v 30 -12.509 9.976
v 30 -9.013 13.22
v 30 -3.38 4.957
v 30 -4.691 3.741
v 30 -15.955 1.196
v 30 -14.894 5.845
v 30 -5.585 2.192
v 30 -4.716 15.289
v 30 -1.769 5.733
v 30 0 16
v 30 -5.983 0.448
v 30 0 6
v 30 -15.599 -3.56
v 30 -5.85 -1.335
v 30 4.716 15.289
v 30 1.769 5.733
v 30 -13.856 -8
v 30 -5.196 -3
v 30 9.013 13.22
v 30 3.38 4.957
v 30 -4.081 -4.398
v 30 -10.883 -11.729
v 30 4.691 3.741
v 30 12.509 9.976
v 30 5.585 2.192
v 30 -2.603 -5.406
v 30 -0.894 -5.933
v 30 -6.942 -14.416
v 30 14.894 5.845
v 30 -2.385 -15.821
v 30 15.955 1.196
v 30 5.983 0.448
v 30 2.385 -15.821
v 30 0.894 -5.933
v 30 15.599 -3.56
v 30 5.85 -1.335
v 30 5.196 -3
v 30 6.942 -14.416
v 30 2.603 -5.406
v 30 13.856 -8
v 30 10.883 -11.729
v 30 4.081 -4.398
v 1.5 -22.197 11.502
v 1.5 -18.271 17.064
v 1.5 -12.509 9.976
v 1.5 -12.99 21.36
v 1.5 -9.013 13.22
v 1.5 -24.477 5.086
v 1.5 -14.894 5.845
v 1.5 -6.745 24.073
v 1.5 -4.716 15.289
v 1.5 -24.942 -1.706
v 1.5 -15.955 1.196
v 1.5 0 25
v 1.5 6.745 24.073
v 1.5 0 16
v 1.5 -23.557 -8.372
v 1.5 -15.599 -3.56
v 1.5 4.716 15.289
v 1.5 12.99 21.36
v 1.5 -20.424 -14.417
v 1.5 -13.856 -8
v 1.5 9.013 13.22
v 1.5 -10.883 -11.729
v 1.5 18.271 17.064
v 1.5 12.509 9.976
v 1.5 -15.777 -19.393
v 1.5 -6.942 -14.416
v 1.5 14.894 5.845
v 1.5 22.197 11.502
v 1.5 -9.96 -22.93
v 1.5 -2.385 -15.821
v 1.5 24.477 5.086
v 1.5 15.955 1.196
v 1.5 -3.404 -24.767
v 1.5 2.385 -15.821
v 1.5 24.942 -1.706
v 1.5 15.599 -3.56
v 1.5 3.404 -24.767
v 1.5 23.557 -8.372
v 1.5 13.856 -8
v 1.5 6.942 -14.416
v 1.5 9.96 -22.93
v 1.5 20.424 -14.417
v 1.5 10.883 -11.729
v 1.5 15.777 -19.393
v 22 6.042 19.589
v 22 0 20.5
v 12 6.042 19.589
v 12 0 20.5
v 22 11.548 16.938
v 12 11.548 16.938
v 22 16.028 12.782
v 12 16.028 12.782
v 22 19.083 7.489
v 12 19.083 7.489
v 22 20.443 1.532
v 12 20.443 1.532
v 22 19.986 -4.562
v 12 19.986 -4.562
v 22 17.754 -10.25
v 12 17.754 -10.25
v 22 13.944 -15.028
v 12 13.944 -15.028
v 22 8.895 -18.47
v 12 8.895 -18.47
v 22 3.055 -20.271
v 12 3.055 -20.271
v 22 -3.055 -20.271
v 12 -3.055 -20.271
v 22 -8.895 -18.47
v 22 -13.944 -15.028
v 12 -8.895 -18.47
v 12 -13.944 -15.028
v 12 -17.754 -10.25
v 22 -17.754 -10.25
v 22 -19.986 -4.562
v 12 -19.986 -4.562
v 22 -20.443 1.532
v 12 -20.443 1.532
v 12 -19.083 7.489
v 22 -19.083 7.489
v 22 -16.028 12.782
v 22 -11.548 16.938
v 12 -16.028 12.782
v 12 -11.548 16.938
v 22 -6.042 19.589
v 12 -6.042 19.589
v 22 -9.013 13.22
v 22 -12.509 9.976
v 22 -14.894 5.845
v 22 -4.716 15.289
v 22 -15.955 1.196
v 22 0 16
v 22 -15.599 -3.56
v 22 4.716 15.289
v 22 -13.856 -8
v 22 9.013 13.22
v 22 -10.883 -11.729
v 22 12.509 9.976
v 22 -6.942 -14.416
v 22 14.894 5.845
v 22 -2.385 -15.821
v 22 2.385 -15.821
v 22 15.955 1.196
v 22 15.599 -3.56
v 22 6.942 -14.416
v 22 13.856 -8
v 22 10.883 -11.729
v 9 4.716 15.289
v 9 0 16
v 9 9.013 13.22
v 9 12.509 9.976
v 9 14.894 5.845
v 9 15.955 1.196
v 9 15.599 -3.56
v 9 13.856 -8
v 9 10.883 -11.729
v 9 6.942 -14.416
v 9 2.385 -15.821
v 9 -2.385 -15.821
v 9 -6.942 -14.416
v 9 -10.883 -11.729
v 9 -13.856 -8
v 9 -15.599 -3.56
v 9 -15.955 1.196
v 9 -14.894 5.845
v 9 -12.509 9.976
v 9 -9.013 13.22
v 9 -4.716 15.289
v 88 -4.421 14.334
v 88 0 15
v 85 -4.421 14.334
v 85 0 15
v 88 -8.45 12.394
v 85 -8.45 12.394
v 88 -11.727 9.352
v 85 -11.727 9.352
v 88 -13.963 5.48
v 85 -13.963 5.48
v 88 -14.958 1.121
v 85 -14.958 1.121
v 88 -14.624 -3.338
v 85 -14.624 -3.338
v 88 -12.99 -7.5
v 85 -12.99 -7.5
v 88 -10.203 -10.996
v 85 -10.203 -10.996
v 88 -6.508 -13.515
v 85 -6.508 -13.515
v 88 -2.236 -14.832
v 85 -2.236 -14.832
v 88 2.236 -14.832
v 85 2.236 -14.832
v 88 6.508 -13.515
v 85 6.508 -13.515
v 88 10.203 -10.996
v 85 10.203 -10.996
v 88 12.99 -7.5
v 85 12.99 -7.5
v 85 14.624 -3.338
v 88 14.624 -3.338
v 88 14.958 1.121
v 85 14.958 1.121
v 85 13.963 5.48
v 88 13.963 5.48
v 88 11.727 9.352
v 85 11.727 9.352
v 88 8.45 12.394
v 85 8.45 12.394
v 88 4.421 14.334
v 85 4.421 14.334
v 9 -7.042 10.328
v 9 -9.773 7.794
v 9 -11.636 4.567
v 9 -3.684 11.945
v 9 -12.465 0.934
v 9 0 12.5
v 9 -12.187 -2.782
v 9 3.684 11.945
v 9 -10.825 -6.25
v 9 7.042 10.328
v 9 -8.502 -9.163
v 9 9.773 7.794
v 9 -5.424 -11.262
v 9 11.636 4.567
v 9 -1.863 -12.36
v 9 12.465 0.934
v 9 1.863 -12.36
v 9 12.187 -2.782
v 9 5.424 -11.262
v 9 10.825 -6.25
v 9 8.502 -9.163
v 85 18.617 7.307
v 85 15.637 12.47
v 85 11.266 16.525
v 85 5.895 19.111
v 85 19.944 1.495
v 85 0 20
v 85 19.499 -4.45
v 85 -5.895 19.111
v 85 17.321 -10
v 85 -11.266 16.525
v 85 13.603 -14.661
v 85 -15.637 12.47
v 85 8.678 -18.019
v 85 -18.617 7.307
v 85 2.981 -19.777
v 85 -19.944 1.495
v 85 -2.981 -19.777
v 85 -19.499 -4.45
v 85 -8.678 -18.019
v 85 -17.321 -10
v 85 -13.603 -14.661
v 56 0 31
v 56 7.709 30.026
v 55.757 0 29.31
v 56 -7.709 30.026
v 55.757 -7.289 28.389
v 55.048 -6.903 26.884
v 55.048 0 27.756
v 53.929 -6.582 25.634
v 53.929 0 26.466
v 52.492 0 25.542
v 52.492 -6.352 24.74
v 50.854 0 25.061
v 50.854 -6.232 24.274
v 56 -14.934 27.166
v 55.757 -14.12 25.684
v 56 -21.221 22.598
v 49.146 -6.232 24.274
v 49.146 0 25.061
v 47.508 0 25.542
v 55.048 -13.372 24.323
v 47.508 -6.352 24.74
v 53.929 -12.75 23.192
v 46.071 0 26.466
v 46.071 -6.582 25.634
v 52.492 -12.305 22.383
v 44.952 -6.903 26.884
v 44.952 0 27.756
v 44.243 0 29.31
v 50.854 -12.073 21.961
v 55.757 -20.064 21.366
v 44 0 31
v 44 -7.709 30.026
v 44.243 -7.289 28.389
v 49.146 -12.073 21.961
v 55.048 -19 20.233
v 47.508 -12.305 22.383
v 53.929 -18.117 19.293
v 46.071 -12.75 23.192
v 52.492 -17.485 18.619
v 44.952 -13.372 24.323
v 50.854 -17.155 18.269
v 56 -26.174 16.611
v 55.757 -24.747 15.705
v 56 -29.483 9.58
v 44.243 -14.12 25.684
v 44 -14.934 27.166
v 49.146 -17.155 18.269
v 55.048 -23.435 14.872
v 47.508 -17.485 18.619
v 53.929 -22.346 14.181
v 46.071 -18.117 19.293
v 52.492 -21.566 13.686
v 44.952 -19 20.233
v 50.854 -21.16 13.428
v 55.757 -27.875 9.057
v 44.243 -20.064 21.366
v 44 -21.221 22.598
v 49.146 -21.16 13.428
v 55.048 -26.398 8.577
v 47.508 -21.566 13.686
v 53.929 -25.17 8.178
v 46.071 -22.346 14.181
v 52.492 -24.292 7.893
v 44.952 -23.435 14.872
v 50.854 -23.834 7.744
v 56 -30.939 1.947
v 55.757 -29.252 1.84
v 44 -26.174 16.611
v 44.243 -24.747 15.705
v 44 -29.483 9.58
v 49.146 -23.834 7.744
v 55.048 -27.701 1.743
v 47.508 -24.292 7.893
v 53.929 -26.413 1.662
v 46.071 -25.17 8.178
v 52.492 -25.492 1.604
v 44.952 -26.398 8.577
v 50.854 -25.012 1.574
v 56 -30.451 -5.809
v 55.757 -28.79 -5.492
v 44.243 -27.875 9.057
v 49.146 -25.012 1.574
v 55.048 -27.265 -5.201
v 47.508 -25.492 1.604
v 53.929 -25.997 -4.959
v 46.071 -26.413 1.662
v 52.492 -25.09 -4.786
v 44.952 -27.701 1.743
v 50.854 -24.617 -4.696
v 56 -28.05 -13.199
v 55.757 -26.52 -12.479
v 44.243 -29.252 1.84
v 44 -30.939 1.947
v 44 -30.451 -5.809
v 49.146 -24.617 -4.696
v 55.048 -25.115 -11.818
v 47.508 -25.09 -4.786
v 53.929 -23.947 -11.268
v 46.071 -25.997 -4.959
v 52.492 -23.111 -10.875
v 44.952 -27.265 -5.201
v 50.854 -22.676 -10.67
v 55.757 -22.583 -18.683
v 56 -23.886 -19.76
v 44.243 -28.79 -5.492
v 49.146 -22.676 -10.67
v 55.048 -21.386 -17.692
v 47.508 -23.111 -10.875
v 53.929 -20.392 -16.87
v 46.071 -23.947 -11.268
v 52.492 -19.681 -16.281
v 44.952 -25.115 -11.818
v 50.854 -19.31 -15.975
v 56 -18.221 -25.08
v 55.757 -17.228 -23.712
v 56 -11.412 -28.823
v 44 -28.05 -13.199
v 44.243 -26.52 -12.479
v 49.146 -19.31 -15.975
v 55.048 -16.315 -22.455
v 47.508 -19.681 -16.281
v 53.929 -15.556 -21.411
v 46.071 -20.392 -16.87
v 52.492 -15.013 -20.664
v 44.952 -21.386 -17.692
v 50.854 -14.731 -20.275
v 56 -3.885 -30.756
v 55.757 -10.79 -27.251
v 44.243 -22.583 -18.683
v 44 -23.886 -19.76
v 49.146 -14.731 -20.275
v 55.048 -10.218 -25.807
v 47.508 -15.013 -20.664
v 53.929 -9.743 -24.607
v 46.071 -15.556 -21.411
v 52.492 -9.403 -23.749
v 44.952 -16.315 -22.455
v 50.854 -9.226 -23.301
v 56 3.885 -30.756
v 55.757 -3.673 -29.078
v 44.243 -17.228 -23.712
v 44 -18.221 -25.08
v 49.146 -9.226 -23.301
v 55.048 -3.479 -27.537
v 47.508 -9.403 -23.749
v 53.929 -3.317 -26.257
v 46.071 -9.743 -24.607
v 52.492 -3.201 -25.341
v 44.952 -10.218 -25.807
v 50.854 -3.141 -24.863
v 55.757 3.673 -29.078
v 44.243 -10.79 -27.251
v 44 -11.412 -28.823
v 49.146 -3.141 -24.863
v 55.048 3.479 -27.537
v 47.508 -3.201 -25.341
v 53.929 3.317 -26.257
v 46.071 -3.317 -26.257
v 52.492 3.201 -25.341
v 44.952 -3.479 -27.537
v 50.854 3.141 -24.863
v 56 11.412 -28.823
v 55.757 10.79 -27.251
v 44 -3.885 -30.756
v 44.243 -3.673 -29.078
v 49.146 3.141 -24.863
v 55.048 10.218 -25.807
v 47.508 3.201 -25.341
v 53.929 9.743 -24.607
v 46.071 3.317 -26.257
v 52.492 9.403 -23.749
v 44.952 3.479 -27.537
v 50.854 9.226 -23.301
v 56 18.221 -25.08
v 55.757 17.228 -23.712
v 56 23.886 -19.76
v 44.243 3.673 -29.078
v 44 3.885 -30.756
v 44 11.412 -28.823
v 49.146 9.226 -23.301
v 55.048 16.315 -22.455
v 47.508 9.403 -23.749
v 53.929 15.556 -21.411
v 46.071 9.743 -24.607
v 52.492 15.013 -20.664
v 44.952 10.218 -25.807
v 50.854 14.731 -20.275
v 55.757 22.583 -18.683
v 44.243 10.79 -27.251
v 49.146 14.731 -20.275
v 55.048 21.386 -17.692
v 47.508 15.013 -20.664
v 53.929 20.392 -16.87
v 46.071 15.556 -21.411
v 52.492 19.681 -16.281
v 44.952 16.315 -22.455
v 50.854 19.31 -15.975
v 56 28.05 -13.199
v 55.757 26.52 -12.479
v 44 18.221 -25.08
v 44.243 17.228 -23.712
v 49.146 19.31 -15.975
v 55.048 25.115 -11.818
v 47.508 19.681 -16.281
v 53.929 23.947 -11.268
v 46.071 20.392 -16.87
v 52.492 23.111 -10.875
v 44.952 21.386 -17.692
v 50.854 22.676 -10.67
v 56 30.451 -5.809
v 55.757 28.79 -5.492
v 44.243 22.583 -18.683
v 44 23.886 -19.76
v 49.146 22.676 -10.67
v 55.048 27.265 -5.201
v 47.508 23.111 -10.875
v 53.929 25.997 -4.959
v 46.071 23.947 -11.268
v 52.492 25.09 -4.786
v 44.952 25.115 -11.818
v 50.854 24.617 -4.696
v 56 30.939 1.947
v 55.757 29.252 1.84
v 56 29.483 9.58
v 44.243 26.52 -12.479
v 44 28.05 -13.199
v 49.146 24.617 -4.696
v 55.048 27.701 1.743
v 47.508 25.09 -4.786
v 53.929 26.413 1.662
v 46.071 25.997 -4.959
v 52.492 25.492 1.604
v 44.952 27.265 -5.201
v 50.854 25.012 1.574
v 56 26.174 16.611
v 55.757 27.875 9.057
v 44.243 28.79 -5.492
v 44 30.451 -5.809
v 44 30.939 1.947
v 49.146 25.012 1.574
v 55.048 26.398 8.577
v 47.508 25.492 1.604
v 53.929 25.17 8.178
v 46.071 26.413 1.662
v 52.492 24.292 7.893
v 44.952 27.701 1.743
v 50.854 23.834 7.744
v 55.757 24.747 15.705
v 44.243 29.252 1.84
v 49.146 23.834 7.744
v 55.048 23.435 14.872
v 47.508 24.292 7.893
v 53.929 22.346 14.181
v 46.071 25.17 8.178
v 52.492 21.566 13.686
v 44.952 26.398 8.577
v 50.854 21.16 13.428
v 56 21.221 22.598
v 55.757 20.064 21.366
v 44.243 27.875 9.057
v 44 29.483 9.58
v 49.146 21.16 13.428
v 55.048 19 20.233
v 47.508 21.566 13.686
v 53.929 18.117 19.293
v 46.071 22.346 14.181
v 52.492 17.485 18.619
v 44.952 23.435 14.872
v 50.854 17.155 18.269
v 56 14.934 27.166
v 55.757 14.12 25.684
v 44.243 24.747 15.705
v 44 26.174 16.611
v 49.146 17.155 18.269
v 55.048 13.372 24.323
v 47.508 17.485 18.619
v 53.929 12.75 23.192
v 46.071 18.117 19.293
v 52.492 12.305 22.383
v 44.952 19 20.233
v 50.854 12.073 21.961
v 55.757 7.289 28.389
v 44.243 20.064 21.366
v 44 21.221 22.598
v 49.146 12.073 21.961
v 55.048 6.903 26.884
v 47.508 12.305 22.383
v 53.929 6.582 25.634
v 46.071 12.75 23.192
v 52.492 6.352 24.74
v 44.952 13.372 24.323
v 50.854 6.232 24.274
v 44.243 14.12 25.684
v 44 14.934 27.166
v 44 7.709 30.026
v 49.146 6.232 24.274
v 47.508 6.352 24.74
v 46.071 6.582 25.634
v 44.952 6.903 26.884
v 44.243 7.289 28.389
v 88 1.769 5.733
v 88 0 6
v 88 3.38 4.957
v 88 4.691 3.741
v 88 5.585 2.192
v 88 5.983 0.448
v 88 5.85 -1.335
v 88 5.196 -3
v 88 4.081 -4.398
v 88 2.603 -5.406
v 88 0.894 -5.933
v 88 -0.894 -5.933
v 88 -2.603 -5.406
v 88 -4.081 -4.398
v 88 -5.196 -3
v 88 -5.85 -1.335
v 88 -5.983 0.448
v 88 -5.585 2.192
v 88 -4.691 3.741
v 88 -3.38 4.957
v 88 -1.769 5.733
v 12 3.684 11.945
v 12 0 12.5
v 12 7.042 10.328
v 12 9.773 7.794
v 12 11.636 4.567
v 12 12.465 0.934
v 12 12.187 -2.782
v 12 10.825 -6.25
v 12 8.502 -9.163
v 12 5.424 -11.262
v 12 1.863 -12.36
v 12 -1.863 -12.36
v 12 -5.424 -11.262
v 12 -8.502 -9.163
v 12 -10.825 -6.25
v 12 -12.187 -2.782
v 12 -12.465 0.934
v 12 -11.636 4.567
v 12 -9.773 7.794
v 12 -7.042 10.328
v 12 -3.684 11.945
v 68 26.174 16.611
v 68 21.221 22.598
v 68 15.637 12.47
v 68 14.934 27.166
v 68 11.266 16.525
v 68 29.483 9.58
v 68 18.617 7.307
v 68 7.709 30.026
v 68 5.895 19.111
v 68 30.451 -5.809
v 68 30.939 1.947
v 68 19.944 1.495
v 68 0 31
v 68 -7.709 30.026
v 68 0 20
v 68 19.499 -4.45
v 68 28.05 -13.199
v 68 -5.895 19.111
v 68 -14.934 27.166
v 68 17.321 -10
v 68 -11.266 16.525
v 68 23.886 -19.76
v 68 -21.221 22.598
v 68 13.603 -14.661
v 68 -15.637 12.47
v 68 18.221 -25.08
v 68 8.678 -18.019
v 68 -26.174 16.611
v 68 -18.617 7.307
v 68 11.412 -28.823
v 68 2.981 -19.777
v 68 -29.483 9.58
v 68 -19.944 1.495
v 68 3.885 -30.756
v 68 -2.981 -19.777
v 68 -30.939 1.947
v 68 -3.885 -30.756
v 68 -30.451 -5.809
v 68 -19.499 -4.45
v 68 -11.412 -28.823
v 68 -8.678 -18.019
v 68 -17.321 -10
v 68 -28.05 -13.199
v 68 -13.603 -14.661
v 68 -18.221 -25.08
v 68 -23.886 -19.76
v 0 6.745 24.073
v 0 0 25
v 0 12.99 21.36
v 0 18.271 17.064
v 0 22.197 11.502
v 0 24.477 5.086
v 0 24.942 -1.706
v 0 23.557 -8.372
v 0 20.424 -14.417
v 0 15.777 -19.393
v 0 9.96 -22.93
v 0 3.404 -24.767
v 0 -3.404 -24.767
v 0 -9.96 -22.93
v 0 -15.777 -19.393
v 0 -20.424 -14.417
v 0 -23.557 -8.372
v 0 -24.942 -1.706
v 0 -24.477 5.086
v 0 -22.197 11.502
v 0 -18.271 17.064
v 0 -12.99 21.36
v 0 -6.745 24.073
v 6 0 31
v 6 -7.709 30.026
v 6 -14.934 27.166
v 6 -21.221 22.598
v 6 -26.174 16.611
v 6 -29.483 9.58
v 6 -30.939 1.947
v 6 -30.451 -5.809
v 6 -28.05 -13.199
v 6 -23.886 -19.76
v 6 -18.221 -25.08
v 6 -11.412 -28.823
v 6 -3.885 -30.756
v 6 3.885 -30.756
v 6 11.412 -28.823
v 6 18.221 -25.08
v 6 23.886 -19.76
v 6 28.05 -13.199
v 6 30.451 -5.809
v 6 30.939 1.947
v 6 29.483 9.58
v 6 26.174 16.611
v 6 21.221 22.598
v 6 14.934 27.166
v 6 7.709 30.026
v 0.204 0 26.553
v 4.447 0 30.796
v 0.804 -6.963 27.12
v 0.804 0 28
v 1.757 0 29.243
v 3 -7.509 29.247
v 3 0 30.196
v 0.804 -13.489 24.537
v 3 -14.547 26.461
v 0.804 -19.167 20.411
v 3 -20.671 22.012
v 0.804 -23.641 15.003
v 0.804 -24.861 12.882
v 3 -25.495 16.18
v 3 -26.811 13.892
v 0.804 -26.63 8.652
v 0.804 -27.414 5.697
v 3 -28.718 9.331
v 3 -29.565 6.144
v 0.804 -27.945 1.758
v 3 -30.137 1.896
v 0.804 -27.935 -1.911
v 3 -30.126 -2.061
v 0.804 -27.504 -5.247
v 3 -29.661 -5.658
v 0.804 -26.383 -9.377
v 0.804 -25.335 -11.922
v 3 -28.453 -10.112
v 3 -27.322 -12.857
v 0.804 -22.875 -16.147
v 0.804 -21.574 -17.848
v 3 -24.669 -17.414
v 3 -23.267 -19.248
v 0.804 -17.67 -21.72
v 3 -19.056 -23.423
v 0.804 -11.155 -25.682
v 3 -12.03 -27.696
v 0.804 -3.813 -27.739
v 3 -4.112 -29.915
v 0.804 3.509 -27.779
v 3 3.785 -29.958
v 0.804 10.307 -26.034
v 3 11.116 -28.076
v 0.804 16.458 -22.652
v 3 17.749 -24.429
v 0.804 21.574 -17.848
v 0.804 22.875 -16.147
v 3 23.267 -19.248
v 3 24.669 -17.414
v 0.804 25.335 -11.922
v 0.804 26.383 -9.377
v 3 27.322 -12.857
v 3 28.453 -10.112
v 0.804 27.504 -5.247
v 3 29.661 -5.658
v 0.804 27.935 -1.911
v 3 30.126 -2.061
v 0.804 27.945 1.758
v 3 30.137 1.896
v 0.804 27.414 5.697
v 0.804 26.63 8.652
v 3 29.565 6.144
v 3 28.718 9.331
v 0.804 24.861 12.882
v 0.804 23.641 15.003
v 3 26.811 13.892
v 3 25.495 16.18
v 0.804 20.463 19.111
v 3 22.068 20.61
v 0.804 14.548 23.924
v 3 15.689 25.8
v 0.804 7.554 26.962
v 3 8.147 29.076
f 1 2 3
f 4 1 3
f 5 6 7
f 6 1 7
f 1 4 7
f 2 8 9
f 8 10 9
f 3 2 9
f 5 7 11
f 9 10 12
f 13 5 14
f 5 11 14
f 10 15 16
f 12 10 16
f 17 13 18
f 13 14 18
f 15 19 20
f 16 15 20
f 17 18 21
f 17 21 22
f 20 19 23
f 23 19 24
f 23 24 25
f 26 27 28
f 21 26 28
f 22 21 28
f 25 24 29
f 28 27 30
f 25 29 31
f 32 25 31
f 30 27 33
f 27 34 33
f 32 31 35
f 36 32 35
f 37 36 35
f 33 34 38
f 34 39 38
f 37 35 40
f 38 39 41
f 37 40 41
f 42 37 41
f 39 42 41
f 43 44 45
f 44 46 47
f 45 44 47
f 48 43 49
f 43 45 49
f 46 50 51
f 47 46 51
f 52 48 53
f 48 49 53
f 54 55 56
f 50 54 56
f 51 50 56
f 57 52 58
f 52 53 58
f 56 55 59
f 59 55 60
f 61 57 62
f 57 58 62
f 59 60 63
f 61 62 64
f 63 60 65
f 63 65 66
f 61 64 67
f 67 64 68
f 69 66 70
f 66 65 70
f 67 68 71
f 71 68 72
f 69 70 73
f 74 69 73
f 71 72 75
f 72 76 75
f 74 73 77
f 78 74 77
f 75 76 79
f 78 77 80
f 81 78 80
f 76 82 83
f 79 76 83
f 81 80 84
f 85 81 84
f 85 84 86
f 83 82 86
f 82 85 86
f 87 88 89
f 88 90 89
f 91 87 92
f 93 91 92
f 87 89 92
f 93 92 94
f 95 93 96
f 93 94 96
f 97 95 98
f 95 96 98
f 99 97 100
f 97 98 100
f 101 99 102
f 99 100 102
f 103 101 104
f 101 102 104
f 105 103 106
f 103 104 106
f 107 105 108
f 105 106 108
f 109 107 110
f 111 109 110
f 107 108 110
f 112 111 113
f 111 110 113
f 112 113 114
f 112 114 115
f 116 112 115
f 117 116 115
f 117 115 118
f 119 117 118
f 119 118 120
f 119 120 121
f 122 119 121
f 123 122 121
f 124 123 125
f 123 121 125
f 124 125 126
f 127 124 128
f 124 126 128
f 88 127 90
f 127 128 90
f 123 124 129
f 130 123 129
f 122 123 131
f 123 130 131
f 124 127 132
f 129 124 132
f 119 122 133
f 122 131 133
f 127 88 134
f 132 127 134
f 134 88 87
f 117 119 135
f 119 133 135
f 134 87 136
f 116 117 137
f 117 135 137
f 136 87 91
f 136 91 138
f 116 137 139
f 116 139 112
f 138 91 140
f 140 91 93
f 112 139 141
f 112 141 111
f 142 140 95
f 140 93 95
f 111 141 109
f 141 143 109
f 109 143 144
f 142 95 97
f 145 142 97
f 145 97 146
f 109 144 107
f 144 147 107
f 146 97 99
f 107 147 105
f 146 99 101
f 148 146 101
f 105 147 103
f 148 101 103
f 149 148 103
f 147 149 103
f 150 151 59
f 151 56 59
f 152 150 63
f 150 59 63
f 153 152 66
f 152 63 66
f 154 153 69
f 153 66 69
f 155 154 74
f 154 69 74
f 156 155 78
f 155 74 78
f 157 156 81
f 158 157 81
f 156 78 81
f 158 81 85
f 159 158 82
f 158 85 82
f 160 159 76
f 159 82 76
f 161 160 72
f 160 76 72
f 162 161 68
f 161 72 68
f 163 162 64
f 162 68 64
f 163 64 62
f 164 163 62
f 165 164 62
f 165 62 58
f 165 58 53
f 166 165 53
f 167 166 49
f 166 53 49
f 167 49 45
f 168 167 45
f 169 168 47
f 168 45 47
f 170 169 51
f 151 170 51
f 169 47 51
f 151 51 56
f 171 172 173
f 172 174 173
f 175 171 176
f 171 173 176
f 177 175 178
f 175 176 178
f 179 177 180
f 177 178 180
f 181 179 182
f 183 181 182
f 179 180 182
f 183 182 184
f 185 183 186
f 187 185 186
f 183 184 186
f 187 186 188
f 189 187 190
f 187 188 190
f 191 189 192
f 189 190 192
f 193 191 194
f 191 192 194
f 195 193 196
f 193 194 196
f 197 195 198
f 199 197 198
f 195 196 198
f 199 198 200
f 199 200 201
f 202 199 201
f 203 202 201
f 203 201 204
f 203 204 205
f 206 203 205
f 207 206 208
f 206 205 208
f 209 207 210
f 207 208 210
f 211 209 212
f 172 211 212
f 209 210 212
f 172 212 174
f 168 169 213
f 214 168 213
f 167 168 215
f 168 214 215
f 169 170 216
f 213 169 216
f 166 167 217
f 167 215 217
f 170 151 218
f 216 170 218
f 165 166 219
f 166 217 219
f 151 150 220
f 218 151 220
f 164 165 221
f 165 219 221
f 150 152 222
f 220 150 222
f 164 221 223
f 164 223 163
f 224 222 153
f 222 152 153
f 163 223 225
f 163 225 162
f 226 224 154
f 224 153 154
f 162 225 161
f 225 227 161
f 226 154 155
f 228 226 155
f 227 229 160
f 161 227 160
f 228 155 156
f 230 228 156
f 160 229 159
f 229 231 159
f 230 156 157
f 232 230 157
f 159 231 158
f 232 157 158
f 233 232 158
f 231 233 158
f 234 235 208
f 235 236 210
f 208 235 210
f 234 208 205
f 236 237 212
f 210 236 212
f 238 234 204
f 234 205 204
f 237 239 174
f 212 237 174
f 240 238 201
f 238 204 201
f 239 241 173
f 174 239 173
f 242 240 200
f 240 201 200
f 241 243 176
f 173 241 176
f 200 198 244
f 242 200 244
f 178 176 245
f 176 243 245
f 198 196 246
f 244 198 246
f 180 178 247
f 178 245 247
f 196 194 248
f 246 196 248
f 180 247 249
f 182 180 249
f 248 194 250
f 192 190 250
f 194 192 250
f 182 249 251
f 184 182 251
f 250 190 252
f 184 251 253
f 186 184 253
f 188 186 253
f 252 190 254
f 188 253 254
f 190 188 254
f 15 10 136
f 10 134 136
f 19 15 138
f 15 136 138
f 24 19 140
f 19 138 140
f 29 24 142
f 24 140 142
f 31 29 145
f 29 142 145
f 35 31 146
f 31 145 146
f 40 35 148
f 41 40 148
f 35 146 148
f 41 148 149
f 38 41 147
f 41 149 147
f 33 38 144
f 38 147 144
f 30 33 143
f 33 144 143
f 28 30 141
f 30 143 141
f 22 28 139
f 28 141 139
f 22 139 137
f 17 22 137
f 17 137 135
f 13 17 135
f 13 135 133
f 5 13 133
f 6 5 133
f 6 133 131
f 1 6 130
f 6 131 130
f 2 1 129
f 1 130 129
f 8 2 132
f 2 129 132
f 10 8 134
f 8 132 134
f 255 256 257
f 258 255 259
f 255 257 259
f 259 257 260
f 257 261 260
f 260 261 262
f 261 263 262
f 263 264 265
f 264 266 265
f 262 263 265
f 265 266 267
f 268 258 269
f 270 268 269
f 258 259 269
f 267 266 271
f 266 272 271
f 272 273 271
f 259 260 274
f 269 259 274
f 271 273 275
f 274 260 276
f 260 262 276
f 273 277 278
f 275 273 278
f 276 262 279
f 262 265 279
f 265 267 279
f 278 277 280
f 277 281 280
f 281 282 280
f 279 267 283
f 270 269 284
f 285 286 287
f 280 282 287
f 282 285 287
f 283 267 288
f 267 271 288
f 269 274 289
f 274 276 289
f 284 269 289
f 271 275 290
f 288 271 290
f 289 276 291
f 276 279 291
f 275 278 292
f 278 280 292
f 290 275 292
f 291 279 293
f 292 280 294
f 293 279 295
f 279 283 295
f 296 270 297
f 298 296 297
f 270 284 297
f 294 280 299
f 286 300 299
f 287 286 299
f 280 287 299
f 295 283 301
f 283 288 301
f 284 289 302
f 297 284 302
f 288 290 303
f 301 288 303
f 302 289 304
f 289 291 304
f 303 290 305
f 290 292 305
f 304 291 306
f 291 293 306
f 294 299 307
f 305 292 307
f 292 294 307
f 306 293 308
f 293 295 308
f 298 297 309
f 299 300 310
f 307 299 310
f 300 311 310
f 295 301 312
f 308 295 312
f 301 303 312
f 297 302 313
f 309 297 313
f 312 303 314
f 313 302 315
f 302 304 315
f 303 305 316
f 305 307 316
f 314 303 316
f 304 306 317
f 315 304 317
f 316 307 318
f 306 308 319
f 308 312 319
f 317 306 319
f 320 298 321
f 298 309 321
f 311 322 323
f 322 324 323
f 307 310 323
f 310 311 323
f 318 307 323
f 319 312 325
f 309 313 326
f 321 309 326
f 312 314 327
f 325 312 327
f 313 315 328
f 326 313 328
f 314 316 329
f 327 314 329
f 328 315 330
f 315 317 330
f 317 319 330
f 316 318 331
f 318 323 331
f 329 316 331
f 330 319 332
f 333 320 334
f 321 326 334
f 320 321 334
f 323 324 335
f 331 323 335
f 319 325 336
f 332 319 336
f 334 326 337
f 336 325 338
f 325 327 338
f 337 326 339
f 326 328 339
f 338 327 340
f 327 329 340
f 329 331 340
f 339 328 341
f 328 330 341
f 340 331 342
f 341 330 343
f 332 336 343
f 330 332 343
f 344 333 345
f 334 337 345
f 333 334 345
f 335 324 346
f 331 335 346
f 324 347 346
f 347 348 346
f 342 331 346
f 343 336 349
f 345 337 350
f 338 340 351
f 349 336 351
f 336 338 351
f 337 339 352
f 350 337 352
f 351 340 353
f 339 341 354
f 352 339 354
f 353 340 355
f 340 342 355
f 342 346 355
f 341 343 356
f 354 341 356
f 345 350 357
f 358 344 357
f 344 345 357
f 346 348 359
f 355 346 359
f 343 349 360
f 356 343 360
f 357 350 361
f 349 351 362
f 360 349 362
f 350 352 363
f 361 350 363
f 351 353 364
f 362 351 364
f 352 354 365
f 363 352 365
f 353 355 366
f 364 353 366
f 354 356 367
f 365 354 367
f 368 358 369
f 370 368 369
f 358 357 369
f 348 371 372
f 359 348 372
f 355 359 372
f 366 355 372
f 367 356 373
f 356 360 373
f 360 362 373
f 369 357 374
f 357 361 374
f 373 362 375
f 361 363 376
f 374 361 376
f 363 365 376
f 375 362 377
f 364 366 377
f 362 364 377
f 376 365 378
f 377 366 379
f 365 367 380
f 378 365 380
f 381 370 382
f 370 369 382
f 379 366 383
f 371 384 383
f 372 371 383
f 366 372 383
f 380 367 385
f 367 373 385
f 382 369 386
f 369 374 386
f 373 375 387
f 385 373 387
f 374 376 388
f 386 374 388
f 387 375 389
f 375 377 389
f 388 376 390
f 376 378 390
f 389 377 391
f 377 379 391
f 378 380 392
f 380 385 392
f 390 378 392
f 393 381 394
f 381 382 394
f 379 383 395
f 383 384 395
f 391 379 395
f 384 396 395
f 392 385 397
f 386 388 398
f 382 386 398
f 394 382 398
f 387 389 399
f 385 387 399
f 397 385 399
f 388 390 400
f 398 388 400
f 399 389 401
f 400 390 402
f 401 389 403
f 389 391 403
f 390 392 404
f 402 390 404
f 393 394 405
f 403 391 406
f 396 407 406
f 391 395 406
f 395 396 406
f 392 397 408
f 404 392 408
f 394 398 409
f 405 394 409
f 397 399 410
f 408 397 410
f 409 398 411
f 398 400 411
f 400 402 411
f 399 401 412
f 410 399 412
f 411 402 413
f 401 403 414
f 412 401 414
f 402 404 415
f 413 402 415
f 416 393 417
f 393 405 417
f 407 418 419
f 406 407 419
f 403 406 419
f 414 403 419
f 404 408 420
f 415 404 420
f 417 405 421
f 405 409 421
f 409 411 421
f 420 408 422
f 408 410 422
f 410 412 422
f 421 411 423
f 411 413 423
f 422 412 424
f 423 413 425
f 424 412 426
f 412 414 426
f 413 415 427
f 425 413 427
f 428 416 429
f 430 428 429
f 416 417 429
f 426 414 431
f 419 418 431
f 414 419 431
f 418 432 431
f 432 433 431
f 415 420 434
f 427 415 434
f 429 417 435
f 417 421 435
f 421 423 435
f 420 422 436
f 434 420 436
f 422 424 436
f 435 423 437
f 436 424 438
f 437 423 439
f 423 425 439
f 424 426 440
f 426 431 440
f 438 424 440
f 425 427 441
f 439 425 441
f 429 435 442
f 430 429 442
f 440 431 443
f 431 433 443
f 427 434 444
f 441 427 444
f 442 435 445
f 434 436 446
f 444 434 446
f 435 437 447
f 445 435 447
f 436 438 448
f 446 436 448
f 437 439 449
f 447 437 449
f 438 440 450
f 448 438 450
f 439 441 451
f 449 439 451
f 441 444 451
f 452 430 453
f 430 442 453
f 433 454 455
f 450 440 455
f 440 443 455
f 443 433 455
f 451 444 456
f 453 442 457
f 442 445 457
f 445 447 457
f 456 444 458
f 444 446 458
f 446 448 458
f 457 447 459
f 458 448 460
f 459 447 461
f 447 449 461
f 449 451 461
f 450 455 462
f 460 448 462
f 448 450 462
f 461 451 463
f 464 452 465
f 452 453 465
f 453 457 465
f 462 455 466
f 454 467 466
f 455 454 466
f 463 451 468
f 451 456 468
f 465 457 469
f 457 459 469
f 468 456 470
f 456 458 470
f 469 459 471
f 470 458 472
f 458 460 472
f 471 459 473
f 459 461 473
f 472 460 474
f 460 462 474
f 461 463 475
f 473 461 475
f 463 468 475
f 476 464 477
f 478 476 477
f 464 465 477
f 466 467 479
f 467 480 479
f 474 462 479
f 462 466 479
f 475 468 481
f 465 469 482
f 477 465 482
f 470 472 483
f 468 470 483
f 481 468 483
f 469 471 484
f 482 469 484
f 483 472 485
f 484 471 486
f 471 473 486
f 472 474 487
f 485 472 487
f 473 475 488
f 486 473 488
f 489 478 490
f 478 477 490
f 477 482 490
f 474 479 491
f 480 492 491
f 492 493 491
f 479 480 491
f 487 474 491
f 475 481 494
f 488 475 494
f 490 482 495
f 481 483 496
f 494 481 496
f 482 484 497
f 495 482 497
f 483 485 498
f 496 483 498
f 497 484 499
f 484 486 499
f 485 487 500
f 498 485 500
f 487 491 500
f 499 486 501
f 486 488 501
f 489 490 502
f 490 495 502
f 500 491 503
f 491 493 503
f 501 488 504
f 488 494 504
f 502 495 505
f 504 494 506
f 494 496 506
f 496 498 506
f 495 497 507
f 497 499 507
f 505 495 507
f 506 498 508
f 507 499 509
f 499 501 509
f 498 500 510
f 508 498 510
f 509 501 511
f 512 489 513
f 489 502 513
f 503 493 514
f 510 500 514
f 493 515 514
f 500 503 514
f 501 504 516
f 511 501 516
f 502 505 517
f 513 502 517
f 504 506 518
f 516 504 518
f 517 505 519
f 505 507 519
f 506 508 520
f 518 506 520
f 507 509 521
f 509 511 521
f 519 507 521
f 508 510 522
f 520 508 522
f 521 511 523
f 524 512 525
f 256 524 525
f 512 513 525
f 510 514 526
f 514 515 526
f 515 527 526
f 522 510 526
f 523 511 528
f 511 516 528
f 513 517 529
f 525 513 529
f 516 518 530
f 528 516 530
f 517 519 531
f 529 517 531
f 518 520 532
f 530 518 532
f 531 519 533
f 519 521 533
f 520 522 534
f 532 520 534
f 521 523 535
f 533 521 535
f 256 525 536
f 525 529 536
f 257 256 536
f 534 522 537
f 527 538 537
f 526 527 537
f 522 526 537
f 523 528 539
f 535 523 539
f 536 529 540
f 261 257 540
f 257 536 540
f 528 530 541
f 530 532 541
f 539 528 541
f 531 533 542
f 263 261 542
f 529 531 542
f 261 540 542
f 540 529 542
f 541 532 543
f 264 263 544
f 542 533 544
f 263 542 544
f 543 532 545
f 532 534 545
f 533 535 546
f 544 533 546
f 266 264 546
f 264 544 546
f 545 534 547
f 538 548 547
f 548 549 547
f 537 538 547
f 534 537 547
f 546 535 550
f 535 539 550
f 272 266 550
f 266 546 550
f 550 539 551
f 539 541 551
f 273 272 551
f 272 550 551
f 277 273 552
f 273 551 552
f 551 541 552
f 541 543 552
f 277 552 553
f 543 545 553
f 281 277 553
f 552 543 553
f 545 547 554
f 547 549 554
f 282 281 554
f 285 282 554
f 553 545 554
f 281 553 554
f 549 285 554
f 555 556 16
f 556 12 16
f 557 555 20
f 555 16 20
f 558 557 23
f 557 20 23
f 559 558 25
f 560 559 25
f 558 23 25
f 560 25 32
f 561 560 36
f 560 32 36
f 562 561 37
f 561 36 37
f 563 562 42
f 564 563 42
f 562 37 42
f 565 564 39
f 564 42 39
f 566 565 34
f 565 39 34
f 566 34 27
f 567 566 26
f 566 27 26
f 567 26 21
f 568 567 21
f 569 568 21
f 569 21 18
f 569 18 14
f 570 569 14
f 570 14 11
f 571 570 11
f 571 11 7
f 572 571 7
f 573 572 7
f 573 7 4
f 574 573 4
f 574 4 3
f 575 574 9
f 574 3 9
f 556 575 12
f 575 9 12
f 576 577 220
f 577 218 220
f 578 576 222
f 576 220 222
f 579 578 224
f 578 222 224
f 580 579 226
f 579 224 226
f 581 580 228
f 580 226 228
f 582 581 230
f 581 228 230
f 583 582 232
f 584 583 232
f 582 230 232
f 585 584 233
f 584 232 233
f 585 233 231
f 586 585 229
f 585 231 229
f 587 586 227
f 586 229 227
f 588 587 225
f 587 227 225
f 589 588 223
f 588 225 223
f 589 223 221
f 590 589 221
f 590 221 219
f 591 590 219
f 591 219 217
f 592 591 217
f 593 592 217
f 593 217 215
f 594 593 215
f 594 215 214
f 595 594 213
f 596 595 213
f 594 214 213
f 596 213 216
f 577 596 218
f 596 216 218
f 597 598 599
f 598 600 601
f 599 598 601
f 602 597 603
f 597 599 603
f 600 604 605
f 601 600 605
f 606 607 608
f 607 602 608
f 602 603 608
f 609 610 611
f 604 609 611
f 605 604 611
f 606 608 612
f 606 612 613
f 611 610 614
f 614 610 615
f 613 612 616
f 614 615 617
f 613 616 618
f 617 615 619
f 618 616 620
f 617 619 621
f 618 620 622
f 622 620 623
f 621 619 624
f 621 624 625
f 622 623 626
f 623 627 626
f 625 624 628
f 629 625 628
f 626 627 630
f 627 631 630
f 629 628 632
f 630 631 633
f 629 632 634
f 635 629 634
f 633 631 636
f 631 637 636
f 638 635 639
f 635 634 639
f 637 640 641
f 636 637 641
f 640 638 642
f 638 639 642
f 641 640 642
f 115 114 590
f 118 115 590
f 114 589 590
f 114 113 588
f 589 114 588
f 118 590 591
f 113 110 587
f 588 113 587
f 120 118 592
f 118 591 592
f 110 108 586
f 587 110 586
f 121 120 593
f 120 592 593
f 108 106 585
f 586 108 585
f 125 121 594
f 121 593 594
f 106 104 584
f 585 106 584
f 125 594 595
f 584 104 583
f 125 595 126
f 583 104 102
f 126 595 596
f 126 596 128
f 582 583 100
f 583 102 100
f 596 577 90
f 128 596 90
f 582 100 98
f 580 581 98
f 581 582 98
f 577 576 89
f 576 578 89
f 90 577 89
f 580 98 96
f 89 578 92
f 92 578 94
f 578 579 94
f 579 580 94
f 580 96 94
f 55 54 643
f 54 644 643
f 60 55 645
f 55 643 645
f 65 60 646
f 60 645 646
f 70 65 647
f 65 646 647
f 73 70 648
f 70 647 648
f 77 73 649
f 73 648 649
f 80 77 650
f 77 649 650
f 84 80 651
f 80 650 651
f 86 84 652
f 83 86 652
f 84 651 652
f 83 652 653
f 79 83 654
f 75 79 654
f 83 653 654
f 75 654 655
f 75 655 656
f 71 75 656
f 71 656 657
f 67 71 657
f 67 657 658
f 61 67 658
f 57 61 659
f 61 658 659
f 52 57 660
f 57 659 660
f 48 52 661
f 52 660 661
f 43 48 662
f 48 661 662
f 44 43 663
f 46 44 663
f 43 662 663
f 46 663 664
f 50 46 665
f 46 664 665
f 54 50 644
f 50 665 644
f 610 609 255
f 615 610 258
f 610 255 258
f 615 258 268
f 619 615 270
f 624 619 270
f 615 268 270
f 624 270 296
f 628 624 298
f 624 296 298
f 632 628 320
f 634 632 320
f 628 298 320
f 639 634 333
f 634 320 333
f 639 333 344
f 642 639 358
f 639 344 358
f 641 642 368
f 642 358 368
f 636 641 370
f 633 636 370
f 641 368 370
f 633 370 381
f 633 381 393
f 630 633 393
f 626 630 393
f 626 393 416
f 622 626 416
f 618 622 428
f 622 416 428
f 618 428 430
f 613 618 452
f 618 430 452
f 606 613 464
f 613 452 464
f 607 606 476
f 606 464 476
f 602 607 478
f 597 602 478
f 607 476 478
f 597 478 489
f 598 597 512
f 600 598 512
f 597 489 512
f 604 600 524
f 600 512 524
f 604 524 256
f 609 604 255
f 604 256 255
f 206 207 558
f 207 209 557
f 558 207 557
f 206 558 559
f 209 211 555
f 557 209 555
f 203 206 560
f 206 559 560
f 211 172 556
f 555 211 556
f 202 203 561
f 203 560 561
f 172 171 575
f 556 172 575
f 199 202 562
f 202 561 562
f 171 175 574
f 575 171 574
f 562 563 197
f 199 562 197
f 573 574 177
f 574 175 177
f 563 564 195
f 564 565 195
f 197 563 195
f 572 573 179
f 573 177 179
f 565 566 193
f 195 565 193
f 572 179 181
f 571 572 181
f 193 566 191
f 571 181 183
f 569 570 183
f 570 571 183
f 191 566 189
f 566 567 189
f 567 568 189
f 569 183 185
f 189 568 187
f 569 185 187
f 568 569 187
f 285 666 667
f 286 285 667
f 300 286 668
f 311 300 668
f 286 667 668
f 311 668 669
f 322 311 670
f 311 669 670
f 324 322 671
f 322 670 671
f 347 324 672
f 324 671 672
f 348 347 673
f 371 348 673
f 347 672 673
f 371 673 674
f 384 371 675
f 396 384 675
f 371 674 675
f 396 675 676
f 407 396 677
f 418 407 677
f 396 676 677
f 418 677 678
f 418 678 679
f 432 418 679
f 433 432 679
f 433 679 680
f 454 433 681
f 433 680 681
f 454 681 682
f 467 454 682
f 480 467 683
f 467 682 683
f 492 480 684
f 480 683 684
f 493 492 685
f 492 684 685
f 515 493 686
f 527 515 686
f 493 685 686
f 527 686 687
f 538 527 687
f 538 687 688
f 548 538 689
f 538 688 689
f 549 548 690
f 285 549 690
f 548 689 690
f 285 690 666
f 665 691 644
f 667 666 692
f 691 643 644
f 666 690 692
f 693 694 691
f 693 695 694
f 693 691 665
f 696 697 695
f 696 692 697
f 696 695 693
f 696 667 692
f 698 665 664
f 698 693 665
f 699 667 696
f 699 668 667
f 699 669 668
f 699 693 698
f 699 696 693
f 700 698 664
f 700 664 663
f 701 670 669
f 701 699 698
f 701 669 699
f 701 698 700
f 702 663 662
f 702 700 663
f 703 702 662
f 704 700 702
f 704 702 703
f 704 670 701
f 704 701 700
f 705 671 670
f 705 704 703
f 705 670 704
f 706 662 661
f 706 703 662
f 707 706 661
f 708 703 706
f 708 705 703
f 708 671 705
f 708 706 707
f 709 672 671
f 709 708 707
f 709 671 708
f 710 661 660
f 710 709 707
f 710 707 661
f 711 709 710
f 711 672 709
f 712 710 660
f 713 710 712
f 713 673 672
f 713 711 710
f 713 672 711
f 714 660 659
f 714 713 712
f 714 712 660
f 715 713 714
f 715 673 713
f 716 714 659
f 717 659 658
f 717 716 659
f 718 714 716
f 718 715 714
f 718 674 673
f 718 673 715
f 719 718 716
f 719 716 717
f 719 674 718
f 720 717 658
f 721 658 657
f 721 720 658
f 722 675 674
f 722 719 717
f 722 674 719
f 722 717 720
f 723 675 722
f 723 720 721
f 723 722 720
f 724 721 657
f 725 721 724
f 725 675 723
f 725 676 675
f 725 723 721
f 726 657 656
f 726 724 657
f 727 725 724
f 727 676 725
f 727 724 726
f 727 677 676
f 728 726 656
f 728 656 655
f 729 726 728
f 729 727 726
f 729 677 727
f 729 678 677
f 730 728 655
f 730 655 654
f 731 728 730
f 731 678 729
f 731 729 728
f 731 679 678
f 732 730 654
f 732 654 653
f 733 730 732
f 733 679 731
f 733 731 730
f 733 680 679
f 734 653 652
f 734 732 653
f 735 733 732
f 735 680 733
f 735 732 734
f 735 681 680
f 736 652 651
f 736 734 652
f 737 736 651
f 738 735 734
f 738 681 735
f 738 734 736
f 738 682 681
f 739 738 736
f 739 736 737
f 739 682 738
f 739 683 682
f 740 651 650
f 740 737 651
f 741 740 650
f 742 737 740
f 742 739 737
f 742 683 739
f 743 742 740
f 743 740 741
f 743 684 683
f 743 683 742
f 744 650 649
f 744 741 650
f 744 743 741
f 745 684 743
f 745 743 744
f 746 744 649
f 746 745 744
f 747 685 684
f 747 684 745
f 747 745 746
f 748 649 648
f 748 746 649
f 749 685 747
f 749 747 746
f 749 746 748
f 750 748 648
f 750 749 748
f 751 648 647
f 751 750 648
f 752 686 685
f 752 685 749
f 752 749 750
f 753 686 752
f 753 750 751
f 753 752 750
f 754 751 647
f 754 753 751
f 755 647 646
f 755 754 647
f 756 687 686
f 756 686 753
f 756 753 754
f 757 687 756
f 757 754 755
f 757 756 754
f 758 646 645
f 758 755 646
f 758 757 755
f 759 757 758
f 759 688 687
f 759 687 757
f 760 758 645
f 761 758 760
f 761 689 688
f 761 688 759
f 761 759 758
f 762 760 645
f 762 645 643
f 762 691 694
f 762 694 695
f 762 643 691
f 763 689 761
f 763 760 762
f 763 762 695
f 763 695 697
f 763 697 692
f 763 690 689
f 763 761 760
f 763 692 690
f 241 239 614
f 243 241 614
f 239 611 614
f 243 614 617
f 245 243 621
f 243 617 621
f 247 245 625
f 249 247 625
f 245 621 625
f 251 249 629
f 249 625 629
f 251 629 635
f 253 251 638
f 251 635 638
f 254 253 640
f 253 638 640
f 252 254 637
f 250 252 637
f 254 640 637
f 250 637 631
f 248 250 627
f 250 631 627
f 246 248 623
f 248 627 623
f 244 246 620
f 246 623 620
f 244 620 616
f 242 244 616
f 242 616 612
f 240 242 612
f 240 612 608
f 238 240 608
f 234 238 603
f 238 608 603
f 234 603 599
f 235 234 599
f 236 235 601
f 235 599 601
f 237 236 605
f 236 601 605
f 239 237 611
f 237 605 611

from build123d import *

# Parameters (mm, degrees)
F4_R = 5.99999


# Not quite as in the source:
# - a fillet or chamfer is up to 0.001 mm smaller than in the source, because OpenCascade refuses the exact size


with BuildPart() as f1:
    # F0 (on Front) → F1 (revolve)
    with BuildSketch(Plane.XZ):
        with BuildLine():
            Line((0, 31), (0, 0))
            Line((0, 0), (88, 0))
            Line((88, 0), (88, 15))
            Line((88, 15), (85, 15))
            Line((85, 15), (85, 20))
            Line((85, 20), (68, 20))
            Line((68, 20), (68, 31))
            Line((68, 31), (56, 31))
            ThreePointArc((56, 31), (50, 25), (44, 31))
            Line((44, 31), (0, 31))
        make_face()
    revolve(axis=Axis((63.3454471827, 0, 0), (1, 0, 0)))

    # F2 (on Front) → F3 (revolve, cut)
    with BuildSketch(Plane.XZ):
        Polygon((0, 25), (0, 0), (88, 0), (88, 6), (30, 6), (30, 16), (22, 16), (22, 20.5), (12, 20.5), (12, 12.5), (9, 12.5), (9, 16), (1.5, 16), (1.5, 25), align=None)
    revolve(axis=Axis((-10.8097042758, 0, 0), (-1, 0, 0)), mode=Mode.SUBTRACT)

    # F4 (radius 6 in the source; OpenCascade refuses exactly that, so slightly less here)
    f4_edges = [f1.edges().sort_by_distance(p)[0] for p in [
        (0, 0, -31),
    ]]
    fillet(f4_edges, radius=F4_R)


solid = f1.part
